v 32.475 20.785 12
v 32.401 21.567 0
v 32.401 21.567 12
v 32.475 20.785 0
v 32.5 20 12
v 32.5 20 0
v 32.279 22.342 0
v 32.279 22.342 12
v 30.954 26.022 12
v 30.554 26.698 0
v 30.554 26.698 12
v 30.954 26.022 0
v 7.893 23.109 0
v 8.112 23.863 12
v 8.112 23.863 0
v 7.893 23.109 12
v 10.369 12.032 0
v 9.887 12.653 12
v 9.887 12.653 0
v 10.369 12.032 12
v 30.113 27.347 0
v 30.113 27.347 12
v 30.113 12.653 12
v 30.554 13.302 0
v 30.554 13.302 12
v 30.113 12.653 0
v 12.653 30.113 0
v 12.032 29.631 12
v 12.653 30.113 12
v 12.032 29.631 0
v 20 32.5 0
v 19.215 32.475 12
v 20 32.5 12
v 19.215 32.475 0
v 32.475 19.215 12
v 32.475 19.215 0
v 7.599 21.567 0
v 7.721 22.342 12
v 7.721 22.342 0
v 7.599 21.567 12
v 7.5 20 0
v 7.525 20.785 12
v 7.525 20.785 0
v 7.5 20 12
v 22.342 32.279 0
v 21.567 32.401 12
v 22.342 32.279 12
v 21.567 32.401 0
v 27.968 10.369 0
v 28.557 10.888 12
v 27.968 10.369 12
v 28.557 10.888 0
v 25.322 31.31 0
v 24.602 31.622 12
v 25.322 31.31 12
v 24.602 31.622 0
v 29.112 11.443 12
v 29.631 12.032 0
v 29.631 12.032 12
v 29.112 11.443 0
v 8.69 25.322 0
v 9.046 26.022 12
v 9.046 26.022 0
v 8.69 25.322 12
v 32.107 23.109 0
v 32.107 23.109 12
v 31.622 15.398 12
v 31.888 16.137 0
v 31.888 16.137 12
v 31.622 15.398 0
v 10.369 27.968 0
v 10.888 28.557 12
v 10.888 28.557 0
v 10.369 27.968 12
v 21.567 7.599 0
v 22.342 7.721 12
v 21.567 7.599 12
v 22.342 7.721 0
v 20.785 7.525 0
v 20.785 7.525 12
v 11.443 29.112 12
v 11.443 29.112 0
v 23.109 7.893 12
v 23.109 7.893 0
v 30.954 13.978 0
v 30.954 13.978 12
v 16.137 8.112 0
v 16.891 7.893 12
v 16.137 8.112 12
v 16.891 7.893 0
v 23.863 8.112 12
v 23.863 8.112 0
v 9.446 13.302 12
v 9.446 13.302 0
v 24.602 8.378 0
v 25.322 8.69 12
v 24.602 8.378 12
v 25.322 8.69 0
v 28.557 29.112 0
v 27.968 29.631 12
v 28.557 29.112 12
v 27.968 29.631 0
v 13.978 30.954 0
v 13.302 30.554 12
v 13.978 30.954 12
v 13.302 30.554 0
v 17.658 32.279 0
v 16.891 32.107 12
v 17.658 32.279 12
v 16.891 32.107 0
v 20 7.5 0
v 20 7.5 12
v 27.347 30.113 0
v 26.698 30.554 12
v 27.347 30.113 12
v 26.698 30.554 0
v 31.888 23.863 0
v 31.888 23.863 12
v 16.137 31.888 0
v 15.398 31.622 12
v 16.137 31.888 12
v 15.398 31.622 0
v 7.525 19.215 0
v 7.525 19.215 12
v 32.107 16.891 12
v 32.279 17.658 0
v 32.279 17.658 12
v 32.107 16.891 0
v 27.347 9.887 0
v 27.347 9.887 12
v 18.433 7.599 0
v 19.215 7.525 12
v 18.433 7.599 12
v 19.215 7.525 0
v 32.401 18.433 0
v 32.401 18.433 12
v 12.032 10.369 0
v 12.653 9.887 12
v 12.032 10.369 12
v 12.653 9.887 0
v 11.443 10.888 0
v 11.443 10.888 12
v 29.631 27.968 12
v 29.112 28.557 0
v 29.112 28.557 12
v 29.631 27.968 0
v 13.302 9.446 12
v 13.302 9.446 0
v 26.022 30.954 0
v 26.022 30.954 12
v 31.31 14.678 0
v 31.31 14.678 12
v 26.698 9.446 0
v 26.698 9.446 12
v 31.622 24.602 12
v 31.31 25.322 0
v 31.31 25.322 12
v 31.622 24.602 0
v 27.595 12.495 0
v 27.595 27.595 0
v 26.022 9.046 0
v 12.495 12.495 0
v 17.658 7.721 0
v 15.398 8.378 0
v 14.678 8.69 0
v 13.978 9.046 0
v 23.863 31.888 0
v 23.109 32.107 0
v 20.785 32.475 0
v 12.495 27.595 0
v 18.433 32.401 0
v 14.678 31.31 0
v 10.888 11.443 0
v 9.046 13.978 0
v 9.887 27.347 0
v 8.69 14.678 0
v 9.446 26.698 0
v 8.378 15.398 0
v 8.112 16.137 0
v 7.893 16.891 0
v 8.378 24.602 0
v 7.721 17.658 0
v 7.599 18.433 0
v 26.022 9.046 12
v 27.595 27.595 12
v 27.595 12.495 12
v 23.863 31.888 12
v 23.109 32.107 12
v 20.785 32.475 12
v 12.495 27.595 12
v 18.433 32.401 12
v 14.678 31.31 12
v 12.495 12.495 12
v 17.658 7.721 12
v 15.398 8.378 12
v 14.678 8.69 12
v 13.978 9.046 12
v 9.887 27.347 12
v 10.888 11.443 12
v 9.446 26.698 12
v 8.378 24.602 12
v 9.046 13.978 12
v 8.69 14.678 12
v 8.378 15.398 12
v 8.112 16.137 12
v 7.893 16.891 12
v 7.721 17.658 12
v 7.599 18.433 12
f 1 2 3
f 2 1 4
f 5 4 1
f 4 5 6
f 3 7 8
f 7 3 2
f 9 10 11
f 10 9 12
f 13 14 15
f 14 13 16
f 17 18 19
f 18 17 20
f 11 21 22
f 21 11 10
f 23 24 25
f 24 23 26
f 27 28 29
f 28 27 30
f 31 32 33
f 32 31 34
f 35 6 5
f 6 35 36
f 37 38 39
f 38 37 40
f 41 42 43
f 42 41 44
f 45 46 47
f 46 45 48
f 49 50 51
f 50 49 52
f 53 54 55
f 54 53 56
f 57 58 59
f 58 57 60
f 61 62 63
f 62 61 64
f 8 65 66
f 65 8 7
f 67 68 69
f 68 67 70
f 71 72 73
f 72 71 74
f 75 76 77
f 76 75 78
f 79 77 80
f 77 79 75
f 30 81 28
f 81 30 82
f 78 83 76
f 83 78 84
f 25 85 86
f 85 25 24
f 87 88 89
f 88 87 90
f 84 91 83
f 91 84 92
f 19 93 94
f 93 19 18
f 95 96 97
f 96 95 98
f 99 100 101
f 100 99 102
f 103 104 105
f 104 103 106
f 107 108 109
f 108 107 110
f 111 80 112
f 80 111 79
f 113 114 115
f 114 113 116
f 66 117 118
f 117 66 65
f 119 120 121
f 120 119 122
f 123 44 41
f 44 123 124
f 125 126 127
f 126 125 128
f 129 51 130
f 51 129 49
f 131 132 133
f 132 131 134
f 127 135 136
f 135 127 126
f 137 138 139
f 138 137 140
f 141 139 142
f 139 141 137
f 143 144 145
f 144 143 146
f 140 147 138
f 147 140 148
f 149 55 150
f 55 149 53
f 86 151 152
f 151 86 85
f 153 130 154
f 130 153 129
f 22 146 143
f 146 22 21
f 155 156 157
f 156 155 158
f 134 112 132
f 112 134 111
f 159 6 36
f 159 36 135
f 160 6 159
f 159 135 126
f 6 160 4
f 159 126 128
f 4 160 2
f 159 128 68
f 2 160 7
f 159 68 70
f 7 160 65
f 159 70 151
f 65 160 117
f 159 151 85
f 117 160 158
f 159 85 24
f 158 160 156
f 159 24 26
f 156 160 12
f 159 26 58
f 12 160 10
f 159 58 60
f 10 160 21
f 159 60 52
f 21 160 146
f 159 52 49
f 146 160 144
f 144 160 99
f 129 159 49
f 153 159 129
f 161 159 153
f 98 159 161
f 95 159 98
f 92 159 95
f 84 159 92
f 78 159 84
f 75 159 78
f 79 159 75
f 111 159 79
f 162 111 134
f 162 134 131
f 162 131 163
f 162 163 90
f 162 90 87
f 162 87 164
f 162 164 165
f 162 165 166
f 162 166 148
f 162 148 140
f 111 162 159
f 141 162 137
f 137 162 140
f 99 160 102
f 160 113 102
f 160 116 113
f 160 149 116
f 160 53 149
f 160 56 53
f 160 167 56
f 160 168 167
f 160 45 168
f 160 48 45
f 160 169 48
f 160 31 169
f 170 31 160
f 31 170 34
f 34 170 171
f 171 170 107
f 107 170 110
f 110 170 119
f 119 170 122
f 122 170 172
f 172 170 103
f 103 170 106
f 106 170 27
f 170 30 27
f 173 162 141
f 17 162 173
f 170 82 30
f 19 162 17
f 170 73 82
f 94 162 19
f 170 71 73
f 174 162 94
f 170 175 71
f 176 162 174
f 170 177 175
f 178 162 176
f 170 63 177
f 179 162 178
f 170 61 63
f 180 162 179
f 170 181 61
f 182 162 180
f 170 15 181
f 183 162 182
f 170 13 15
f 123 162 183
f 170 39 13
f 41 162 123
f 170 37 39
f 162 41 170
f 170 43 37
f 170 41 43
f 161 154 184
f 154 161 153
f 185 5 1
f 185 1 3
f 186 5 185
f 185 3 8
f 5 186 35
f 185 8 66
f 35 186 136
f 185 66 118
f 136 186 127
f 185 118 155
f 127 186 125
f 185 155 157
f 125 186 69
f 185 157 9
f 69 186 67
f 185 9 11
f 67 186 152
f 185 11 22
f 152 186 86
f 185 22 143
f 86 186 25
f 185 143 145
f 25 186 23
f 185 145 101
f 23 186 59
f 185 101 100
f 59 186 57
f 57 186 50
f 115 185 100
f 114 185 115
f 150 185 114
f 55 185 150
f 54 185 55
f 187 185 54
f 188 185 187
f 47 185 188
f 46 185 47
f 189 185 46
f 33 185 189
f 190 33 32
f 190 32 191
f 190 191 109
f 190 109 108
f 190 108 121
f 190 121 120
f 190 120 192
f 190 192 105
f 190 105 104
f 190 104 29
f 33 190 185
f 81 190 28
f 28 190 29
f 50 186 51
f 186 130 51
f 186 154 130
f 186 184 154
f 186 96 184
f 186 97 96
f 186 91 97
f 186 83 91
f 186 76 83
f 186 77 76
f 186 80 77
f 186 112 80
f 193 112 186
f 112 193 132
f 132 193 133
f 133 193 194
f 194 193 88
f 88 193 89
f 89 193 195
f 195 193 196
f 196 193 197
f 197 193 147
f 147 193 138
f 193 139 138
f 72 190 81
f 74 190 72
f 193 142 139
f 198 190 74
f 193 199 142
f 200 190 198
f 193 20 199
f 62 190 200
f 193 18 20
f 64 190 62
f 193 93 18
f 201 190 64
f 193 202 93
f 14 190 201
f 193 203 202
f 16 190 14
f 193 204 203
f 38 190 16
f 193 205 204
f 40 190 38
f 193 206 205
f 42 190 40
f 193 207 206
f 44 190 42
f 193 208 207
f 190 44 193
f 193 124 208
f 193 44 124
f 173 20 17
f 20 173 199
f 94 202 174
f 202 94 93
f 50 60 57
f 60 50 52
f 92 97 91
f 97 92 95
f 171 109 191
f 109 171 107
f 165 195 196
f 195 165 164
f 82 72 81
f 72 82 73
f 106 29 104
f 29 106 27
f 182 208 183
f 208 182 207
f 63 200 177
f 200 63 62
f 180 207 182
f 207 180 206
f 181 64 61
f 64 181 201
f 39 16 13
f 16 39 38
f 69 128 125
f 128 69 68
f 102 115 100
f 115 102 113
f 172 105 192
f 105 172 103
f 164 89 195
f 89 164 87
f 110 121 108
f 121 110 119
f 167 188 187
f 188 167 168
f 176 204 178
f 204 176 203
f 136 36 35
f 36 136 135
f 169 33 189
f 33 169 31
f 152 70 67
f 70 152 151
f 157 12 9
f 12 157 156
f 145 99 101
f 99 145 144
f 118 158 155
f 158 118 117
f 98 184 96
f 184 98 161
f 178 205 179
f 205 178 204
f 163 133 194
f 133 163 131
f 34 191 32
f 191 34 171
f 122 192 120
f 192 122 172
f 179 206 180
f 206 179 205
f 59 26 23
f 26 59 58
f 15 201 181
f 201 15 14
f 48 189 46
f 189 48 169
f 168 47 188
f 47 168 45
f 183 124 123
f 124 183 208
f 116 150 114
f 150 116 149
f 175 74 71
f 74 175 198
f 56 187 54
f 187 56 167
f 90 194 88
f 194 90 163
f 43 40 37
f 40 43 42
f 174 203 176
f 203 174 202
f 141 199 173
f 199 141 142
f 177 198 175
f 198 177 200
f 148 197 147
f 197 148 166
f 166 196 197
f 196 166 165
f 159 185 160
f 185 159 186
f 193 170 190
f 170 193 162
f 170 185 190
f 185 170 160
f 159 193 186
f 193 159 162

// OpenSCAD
$fn=100;

module openbeam () {
    union() {
        difference() {
            cylinder(r=12.5, h=12);
            translate([-7.505,-7.505, -1]) {
                cube([15.1,15.1,14]);
            }
        }
    }
}


translate([20,20,0]) {
    openbeam();
}
